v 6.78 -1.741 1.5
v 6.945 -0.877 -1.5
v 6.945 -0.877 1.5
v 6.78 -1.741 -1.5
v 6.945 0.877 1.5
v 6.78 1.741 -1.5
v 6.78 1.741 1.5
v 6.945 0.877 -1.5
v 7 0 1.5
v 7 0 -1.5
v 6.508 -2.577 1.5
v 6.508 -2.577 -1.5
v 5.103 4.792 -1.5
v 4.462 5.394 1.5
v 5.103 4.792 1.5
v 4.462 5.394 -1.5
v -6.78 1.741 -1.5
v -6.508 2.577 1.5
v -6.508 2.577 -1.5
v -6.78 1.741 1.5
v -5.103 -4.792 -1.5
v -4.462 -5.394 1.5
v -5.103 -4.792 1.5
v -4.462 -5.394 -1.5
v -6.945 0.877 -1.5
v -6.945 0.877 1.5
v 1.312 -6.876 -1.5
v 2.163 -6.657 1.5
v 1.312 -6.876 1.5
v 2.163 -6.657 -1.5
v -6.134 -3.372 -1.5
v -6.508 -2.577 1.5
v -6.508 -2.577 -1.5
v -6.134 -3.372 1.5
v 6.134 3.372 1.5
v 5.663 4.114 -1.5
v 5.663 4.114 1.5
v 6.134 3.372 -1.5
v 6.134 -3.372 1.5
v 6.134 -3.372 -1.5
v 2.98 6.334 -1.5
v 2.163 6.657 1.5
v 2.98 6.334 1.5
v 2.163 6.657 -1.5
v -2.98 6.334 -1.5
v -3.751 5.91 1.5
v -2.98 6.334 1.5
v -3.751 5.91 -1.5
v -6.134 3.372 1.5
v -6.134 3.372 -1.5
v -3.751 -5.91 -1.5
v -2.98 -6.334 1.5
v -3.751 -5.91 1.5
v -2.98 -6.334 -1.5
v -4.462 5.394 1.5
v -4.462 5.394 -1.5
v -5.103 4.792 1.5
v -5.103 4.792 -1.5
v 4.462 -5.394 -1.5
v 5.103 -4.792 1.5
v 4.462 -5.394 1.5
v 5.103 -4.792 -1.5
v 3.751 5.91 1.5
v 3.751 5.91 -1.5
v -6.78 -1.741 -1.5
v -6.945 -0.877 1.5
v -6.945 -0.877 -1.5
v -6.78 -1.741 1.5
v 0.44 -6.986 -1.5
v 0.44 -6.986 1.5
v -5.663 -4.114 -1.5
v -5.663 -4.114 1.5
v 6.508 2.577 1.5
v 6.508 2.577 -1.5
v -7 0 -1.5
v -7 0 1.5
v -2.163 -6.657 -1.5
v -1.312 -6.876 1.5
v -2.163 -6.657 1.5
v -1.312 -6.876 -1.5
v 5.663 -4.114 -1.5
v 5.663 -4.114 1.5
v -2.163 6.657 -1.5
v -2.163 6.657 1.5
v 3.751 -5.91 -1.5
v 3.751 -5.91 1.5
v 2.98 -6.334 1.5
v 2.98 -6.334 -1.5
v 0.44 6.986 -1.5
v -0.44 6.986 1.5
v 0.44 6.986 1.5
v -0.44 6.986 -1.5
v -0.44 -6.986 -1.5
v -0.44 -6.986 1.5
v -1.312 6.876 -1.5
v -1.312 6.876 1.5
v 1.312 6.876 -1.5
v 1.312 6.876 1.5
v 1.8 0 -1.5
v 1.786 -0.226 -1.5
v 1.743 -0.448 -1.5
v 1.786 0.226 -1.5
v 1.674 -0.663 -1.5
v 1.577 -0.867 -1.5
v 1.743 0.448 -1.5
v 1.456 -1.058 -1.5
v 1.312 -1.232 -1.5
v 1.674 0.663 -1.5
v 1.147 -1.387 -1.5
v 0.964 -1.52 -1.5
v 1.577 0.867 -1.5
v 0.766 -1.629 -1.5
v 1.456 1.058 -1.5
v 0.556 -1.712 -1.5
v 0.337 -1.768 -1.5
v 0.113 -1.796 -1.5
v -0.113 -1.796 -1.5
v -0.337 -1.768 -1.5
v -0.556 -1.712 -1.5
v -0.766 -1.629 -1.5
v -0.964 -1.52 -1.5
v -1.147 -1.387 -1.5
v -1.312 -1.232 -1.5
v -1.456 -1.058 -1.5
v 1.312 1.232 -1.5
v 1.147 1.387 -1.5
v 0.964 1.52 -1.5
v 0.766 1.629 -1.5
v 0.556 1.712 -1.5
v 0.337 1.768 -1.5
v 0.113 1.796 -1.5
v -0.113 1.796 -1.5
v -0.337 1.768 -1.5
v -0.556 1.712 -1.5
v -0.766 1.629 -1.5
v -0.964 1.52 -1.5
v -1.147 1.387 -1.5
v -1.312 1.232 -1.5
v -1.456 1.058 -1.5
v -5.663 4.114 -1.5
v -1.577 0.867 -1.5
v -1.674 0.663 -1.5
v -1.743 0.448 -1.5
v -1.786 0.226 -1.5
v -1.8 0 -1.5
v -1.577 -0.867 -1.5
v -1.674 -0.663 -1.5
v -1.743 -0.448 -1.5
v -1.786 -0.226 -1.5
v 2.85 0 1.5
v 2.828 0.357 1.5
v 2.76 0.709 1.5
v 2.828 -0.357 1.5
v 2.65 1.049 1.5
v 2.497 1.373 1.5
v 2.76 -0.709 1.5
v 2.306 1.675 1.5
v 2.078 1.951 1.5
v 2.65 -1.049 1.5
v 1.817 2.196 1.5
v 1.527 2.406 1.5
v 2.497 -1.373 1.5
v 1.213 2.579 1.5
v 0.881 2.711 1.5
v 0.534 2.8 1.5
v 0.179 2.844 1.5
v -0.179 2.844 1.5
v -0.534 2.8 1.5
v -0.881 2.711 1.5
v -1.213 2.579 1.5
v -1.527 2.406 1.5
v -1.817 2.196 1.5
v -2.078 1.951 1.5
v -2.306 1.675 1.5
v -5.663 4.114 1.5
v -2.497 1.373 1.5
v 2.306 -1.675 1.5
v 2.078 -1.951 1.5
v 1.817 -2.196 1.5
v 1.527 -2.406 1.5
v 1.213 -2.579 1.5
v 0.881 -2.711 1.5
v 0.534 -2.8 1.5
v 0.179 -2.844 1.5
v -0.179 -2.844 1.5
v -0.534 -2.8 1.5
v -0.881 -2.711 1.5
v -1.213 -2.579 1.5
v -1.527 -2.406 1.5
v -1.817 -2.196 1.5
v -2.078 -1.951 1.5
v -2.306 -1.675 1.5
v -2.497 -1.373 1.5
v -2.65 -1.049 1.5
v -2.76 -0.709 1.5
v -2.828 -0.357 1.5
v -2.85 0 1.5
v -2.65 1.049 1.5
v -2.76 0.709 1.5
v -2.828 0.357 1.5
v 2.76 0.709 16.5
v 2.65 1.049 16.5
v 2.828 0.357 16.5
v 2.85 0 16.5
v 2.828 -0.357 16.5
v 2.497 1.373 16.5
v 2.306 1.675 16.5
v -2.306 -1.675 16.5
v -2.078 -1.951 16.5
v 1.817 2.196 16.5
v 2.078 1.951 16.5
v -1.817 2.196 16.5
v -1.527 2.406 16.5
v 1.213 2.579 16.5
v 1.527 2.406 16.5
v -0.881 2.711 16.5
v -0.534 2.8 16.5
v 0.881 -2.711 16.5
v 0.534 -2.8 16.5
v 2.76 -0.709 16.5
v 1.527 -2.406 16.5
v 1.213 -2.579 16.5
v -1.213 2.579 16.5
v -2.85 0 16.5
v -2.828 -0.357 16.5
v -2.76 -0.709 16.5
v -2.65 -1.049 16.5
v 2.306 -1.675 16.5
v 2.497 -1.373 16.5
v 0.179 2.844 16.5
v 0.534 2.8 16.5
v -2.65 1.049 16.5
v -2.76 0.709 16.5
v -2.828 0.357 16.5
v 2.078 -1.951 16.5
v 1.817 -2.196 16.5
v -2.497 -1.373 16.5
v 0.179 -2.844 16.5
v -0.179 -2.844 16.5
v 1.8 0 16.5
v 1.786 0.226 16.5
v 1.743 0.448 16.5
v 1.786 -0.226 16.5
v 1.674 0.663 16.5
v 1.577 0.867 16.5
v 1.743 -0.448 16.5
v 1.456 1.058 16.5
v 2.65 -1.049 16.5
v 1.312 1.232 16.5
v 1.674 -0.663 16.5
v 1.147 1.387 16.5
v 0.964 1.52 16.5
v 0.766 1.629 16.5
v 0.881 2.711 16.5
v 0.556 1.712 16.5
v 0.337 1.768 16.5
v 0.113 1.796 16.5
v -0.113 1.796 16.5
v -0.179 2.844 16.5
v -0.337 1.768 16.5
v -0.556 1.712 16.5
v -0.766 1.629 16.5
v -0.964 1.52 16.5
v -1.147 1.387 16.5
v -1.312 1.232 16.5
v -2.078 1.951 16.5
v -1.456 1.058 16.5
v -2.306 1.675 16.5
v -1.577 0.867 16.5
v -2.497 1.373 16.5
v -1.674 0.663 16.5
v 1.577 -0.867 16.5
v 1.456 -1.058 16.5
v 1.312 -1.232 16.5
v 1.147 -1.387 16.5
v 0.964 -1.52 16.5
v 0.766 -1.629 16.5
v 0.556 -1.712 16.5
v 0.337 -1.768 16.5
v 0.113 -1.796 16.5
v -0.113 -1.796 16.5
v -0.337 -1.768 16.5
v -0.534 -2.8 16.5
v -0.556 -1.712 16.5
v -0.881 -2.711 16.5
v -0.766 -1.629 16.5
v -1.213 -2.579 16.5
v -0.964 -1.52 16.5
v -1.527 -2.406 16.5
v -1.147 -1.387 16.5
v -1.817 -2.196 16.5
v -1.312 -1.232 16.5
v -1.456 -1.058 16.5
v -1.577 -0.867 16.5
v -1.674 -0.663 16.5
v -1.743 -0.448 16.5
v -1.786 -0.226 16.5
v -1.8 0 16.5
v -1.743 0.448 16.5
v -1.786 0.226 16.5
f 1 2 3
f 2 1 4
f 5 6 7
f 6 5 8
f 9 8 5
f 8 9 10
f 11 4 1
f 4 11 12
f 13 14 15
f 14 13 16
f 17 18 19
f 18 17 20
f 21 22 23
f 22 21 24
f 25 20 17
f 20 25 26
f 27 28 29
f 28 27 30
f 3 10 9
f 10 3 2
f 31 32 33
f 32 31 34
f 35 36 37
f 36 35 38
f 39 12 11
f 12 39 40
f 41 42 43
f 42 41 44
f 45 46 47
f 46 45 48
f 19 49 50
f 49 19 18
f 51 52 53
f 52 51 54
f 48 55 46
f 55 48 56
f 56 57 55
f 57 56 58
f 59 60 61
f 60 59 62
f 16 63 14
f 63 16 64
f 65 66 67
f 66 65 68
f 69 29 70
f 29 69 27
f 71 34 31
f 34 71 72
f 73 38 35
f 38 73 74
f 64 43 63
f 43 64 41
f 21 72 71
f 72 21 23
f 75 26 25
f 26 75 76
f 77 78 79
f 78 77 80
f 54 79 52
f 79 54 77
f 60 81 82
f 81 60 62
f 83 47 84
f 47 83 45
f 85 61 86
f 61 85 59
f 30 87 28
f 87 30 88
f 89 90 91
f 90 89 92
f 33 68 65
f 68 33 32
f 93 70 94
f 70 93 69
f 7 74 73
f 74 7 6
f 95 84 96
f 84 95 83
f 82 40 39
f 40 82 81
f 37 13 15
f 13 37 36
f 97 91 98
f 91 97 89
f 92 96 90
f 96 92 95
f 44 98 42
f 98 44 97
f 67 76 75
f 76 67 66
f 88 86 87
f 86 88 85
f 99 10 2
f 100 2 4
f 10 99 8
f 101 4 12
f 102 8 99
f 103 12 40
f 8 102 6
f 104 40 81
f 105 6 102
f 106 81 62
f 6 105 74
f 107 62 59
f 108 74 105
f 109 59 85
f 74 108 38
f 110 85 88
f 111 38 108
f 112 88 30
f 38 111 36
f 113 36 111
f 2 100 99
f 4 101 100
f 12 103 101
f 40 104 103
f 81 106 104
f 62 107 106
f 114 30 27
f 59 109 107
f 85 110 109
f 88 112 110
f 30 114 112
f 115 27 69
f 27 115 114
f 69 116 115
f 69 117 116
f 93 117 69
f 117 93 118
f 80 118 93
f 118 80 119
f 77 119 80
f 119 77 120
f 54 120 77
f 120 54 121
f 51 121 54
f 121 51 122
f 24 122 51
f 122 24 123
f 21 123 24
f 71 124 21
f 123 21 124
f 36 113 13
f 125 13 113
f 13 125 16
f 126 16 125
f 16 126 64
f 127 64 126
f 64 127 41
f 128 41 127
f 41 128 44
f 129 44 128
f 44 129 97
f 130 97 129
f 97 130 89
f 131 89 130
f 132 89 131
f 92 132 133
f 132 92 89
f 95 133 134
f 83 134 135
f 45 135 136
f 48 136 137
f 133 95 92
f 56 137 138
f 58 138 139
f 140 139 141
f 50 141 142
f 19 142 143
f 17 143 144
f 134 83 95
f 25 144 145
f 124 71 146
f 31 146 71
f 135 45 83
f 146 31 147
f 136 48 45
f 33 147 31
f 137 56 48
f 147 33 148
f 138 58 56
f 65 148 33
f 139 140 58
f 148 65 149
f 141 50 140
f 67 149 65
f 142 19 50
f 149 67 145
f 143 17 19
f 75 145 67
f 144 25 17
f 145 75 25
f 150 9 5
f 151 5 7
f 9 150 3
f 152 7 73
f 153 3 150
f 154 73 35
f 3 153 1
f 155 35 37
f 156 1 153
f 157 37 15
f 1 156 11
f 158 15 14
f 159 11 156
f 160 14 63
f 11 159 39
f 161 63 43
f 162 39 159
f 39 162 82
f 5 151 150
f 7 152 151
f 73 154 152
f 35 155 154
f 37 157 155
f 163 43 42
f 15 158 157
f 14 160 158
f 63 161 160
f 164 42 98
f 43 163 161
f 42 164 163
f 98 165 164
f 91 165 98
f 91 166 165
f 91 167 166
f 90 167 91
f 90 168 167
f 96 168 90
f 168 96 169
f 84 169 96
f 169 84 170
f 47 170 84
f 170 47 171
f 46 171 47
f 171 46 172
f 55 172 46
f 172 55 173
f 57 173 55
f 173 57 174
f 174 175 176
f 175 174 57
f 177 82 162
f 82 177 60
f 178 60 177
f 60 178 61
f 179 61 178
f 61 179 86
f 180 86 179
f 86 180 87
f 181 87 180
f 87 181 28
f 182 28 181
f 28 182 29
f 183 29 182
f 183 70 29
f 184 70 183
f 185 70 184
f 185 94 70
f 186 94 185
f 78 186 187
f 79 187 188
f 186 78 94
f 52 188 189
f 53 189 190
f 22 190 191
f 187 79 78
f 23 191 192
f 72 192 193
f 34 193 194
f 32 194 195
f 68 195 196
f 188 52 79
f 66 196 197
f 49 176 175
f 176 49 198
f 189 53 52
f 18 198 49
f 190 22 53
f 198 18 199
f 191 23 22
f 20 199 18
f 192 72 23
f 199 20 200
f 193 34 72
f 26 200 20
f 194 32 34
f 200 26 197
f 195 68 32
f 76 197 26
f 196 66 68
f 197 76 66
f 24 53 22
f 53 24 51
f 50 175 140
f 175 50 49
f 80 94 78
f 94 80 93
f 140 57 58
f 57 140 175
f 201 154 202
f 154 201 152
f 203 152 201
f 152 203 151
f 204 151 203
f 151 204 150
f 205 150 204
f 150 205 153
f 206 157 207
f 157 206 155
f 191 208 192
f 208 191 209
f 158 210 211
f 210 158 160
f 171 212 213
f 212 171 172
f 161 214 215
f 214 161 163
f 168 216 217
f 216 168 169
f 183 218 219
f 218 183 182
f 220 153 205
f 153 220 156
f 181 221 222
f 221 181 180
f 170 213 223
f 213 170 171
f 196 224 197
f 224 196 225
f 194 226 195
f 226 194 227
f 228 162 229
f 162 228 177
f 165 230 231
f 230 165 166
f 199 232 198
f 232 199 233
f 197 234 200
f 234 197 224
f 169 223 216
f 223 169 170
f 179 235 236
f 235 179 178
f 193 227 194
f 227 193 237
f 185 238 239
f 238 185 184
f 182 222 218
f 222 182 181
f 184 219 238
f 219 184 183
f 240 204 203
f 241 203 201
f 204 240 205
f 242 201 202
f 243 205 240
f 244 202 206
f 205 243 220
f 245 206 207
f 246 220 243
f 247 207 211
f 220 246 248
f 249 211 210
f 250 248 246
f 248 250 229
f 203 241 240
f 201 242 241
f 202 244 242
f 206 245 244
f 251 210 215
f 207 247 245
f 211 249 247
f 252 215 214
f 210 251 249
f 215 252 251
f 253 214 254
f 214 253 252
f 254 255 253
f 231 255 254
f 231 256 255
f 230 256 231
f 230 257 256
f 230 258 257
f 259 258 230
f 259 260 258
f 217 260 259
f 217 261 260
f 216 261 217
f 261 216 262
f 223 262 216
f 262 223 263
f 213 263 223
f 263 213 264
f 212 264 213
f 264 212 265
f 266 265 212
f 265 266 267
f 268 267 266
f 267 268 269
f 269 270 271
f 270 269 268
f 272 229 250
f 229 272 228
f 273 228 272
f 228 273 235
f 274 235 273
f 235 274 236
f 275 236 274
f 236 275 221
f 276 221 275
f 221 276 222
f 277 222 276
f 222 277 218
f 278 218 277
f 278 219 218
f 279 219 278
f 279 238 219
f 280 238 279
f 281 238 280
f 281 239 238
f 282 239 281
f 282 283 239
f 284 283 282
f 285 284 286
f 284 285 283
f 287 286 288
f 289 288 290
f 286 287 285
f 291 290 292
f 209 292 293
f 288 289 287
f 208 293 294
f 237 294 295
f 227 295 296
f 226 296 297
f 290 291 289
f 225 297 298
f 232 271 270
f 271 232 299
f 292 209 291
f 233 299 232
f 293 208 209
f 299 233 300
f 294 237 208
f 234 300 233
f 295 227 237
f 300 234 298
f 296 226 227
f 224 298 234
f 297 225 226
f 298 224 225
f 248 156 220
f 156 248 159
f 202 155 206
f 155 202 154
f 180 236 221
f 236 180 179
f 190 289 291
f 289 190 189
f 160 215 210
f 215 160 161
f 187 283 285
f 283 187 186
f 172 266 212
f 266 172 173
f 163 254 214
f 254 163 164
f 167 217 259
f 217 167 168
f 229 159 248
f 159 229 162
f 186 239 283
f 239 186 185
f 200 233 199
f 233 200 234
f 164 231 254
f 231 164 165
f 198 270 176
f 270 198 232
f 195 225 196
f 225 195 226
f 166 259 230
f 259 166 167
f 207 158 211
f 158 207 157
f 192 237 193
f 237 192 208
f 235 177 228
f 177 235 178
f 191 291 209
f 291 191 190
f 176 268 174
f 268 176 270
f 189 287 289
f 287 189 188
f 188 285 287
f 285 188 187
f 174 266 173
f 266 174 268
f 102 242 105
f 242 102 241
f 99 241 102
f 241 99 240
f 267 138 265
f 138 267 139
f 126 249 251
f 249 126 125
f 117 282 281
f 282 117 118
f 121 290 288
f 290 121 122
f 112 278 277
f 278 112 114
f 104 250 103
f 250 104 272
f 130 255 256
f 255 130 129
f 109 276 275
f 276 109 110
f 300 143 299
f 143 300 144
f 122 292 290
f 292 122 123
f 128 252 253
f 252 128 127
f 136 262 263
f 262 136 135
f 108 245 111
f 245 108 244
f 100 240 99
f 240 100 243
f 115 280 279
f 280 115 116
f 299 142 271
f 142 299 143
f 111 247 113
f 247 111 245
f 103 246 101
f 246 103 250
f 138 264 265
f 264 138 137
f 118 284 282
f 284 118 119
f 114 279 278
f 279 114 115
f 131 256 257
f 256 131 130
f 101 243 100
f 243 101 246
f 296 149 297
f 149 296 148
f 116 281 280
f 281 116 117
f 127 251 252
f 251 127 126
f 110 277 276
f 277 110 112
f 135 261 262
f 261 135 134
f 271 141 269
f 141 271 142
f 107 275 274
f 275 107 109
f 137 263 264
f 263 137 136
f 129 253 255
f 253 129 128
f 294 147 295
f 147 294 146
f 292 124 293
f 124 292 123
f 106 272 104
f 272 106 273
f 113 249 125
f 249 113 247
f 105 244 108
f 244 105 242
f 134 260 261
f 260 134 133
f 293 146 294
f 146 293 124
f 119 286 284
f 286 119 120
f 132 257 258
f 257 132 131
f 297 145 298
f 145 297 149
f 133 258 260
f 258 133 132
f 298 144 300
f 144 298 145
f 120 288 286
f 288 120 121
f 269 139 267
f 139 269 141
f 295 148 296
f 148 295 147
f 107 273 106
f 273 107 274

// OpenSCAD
$fn = 50;


difference() {
	union() {
		translate(v = [0, 0, -1.5000000000]) {
			cylinder(h = 3, r = 7.0000000000);
		}
		translate(v = [0, 0, -1.5000000000]) {
			cylinder(h = 18, r = 2.8500000000);
		}
	}
	union() {
		translate(v = [0, 0, -50.0000000000]) {
			cylinder(h = 100, r = 1.8000000000);
		}
	}
}
